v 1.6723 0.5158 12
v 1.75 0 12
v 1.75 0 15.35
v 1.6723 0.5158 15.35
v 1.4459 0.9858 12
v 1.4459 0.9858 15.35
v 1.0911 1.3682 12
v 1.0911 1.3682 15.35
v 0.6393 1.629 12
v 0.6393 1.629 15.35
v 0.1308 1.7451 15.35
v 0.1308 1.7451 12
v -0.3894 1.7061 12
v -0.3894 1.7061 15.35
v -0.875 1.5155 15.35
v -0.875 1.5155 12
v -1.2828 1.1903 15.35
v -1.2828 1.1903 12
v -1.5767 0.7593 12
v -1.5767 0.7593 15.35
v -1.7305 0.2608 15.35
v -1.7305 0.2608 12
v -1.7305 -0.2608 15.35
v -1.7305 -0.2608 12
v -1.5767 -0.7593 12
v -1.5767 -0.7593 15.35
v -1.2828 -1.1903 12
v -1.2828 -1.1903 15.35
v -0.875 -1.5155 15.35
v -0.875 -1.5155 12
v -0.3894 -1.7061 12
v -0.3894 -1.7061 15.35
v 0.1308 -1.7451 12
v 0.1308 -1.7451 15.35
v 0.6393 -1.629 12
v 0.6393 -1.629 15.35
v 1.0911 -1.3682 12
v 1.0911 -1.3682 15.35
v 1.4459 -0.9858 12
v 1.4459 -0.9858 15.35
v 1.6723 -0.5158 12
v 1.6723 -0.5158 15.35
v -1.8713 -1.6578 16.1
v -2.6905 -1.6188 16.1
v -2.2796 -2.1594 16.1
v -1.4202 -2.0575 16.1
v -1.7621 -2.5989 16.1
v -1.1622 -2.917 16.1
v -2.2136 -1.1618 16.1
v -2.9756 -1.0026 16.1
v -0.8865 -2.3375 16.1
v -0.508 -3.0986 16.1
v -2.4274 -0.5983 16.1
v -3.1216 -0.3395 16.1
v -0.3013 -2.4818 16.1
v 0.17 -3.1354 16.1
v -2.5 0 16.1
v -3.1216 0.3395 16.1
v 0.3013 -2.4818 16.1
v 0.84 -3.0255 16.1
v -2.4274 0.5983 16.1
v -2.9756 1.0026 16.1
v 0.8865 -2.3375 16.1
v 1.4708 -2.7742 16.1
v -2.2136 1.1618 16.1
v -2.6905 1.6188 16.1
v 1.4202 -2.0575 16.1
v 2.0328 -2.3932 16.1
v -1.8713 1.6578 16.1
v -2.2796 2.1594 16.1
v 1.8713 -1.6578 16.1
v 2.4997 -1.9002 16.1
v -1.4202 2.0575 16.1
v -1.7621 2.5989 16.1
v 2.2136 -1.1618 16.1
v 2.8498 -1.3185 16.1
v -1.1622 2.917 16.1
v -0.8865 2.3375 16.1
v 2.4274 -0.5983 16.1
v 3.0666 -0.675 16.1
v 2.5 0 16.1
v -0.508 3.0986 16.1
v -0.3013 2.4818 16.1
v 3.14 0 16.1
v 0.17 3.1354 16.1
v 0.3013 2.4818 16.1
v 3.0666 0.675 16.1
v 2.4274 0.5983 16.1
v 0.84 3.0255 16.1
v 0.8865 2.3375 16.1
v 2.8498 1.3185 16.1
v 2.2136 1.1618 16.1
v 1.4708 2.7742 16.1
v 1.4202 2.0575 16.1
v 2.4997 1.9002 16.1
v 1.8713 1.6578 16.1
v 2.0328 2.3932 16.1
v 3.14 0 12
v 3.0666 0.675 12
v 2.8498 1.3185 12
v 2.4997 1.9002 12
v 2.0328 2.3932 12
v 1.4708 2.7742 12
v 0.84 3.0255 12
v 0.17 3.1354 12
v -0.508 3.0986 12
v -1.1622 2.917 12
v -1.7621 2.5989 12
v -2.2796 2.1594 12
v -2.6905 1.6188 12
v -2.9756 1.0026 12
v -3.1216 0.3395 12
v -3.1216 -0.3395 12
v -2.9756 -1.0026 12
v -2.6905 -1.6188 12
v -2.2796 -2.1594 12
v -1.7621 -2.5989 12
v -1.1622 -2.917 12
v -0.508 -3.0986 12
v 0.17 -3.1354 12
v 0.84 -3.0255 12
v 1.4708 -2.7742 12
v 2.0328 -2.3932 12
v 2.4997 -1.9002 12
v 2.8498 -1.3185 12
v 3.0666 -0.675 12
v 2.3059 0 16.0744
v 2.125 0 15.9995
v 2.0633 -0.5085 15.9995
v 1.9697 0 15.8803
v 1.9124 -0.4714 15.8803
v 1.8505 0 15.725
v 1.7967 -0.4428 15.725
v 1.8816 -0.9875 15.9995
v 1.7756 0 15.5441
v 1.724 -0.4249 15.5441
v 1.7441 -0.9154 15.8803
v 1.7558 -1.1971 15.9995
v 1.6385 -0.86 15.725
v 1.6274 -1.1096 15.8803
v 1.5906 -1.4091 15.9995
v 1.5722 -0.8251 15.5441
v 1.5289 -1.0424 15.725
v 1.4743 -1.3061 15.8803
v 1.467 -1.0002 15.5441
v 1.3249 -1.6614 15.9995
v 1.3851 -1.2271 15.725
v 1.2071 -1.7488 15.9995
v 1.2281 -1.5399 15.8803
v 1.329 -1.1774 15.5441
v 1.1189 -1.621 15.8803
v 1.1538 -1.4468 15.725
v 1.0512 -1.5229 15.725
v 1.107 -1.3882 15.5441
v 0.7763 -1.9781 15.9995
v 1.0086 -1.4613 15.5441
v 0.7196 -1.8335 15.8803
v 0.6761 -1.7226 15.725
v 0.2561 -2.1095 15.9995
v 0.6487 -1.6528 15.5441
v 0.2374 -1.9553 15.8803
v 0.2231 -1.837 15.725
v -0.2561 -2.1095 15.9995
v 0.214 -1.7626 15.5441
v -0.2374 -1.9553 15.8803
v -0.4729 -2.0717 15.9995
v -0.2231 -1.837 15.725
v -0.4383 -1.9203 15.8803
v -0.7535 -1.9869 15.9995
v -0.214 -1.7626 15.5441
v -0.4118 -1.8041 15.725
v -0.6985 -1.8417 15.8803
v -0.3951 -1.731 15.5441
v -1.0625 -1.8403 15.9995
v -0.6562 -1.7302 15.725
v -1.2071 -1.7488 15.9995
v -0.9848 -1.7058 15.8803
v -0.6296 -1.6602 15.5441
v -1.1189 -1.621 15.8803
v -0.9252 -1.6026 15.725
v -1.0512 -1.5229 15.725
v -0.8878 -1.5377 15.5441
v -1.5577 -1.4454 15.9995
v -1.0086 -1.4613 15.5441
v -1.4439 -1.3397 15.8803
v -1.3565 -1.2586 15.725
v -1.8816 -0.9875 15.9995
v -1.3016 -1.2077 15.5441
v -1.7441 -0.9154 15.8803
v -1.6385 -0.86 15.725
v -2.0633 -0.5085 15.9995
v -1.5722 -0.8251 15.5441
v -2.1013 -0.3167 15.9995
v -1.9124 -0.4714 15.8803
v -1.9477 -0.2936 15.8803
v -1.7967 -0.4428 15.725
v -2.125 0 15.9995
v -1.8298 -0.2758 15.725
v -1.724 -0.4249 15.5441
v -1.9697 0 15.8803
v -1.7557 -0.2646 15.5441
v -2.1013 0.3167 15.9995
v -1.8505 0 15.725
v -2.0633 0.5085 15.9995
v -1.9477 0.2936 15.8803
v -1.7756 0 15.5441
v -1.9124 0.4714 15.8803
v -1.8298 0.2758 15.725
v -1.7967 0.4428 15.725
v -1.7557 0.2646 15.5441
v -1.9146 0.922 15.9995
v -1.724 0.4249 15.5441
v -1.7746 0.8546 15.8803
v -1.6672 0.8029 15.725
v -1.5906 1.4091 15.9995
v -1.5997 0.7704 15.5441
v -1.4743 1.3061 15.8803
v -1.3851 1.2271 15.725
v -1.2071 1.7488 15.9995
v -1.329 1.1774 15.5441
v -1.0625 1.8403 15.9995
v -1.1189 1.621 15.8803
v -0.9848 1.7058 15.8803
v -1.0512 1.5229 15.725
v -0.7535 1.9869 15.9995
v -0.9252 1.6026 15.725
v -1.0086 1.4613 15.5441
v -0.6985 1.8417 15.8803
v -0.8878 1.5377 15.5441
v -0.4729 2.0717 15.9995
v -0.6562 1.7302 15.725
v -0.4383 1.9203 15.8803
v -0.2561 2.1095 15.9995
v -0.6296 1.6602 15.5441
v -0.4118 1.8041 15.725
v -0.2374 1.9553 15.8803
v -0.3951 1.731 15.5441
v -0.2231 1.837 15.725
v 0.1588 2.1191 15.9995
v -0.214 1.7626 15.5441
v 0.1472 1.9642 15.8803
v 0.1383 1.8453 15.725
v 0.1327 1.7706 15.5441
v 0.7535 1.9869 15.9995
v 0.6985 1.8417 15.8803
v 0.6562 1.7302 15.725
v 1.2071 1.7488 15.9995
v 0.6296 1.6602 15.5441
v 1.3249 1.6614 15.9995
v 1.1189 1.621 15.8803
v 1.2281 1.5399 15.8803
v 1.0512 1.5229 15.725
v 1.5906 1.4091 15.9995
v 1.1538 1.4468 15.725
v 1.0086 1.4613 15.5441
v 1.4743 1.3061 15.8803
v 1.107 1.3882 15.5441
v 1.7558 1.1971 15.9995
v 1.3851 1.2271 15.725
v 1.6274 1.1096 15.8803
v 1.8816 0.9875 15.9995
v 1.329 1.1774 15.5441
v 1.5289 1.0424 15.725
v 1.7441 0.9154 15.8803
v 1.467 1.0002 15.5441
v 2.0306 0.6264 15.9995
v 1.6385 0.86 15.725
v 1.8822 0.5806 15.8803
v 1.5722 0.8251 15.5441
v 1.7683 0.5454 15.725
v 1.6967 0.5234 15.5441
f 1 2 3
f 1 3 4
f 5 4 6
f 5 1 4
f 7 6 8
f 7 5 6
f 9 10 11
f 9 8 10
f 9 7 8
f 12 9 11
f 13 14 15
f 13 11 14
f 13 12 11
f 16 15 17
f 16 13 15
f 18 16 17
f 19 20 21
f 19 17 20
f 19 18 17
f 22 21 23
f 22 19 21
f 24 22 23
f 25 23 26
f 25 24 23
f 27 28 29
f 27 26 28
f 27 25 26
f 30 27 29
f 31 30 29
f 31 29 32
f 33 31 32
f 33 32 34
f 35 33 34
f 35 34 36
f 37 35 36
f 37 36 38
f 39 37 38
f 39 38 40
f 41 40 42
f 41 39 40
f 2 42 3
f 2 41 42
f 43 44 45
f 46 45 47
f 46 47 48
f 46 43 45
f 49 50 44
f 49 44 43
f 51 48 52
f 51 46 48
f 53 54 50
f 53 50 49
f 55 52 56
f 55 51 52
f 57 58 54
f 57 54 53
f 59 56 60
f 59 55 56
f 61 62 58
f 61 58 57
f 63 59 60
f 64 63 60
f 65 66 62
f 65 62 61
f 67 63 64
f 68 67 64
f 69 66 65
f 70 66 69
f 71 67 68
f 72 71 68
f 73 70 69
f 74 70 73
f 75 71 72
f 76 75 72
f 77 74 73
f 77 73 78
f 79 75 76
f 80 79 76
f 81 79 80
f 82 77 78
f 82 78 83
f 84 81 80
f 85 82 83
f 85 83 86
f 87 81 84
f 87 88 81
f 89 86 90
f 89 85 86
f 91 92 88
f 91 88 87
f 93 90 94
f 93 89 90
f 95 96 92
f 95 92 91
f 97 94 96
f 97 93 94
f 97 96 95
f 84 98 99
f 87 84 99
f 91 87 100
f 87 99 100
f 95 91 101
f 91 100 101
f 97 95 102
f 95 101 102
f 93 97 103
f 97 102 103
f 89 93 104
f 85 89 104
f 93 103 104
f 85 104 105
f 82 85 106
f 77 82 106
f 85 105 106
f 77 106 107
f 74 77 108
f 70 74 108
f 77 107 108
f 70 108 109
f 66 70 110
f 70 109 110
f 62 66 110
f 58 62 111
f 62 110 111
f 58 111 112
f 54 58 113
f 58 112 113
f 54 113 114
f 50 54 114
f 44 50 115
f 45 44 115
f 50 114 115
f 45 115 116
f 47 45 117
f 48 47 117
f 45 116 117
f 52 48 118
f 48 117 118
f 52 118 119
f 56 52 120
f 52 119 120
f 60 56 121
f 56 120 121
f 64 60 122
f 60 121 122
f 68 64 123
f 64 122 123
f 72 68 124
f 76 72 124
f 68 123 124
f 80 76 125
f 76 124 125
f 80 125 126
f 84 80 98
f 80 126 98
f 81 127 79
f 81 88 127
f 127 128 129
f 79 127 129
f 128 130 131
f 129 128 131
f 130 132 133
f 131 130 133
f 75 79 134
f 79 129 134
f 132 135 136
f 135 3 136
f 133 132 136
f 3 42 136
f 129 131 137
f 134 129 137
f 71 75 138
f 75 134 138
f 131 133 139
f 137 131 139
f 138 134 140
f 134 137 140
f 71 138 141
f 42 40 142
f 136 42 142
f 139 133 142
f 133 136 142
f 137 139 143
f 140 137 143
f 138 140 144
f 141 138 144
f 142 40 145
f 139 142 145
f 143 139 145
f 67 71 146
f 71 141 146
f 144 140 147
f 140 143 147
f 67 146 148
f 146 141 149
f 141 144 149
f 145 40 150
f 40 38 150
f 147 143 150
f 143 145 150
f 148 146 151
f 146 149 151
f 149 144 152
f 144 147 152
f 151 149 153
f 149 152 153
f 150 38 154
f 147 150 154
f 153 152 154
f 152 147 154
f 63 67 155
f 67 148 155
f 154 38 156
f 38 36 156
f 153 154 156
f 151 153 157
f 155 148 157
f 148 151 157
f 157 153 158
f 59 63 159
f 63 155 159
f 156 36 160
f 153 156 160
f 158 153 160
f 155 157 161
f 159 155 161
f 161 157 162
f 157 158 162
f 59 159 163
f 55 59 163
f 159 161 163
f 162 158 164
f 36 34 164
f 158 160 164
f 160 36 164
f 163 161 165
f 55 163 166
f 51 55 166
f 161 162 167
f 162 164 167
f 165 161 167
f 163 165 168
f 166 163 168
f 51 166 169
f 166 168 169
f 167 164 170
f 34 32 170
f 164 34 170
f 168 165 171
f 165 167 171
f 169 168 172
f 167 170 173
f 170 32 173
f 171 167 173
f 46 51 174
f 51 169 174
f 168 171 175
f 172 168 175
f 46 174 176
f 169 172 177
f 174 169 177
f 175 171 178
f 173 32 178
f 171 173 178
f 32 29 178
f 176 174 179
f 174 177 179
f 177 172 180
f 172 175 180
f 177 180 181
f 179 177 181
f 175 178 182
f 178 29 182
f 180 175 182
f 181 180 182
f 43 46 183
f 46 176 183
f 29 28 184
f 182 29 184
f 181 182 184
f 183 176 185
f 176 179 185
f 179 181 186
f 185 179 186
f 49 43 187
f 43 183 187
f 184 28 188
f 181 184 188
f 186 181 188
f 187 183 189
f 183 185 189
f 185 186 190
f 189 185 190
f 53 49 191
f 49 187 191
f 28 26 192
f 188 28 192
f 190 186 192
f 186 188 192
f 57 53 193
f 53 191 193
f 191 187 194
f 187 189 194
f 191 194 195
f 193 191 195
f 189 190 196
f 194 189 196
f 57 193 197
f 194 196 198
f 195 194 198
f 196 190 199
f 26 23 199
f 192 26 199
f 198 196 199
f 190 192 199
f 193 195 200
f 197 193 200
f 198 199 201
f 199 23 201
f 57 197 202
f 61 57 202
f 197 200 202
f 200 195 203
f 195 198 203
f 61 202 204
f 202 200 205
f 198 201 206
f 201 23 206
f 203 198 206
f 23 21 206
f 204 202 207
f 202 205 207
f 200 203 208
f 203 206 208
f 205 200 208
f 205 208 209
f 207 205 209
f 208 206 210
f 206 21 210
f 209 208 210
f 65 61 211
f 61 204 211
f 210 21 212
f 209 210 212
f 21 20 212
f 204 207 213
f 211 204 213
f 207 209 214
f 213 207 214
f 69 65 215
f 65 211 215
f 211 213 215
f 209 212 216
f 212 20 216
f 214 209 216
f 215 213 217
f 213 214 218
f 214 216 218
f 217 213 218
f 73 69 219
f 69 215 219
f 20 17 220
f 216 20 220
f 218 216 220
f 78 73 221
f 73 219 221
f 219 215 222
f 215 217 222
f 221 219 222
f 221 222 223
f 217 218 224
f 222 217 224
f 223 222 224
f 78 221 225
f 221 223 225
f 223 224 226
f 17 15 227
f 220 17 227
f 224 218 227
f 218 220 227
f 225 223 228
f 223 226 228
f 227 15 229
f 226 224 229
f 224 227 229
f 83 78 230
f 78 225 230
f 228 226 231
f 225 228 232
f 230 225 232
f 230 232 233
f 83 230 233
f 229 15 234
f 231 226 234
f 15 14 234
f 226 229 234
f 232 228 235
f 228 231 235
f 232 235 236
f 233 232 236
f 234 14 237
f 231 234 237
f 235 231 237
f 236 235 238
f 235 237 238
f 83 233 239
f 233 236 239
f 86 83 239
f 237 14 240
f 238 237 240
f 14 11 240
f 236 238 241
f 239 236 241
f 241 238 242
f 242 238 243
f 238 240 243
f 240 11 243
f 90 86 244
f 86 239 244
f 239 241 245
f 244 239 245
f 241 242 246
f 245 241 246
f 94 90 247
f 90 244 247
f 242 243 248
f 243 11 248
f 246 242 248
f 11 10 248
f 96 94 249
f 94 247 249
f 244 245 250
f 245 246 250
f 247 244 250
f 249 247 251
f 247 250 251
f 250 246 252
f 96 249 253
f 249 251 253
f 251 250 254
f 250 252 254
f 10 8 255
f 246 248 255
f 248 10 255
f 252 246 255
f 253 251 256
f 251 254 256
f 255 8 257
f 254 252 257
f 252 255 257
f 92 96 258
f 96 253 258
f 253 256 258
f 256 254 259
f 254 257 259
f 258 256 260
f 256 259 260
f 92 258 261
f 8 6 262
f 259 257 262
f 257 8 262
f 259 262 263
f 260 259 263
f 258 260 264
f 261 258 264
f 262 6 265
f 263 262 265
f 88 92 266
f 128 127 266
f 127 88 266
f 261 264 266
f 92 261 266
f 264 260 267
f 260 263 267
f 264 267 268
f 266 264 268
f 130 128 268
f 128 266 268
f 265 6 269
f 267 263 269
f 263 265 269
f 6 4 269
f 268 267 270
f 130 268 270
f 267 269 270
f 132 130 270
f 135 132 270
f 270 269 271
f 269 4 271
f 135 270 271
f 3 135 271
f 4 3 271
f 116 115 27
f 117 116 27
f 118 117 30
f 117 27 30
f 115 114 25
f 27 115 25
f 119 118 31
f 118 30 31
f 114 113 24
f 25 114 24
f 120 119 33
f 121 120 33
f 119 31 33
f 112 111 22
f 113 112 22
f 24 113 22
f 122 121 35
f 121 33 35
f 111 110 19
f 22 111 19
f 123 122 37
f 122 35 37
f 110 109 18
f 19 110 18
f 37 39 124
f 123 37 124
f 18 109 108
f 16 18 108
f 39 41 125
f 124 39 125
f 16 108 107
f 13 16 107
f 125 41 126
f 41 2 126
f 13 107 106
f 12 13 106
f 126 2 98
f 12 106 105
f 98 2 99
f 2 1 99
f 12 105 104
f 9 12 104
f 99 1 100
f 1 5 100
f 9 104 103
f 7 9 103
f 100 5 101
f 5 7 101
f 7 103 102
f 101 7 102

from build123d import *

# Parameters (mm, degrees)
CYLINDER012_R     = 3.14
CYLINDER012_DEPTH = 4.1
CYLINDER013_R     = 1.75
CYLINDER013_DEPTH = 14
FILLET005_R       = 0.75


with BuildPart() as part:
    # Cylinder012 → Cylinder012 (join)
    with BuildSketch(Plane.XY.offset(12)):
        Circle(CYLINDER012_R)
    extrude(amount=CYLINDER012_DEPTH)

    # Cylinder013 → Cylinder013 (cut)
    with BuildSketch(Plane.XY.offset(3)):
        Circle(CYLINDER013_R)
    extrude(amount=CYLINDER013_DEPTH, mode=Mode.SUBTRACT)

    # Fillet005
    fillet005_edges = [part.edges().sort_by_distance(p)[0] for p in [
        (-1.75, 0, 16.1),
    ]]
    fillet(fillet005_edges, radius=FILLET005_R)


solid = part.part
